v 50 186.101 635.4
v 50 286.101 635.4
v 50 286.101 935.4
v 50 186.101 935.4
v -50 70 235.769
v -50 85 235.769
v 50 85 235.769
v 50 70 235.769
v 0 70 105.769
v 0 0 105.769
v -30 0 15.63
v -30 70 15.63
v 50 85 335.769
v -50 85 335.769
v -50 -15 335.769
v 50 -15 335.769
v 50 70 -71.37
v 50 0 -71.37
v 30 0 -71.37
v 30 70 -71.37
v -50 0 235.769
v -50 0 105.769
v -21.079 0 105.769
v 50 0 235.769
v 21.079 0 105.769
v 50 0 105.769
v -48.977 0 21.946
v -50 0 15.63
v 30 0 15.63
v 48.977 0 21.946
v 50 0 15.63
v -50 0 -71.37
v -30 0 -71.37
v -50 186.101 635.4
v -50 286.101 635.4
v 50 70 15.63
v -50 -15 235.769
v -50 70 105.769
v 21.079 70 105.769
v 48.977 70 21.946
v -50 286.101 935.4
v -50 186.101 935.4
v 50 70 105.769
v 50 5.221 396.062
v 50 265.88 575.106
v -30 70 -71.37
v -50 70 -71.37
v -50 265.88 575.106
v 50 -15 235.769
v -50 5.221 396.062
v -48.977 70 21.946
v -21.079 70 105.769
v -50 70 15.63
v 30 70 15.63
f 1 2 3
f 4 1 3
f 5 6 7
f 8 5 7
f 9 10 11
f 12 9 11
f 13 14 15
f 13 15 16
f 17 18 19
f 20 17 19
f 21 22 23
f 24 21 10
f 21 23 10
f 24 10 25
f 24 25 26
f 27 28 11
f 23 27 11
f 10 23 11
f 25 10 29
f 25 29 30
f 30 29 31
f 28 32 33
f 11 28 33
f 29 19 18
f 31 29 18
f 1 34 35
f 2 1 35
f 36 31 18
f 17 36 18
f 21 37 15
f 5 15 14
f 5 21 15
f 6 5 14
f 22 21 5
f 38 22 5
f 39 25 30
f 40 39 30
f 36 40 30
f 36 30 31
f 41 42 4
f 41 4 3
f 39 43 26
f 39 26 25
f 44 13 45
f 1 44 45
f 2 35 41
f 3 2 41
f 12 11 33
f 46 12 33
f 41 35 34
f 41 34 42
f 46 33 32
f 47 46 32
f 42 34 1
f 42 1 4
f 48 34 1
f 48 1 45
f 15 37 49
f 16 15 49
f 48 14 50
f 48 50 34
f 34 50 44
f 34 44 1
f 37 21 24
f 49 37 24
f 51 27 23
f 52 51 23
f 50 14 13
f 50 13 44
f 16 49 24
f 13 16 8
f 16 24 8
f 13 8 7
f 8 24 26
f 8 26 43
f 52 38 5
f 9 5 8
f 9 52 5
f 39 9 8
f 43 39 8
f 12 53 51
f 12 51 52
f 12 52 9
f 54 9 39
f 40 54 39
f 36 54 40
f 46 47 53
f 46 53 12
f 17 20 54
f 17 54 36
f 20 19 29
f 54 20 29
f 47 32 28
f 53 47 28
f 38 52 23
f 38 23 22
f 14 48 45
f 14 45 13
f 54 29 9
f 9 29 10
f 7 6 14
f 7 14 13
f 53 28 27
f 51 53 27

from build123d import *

# Parameters (mm, degrees)
BOSS_EXTRUDE1_DEPTH = 70
SKETCH2_W           = 100
SKETCH2_H           = 100
BOSS_EXTRUDE2_DEPTH = 100
BOSS_EXTRUDE3_DEPTH = 100
SKETCH4_W           = 300
SKETCH4_H           = 100
BOSS_EXTRUDE4_DEPTH = 100


with BuildPart() as part:
    # Sketch1 → Boss-Extrude1 (new body)
    with BuildSketch(Plane(origin=(0, 0, 0), x_dir=(1, 0, 0), z_dir=(0, 1, 0))):
        Polygon((0, -105.768782521), (-30, -15.630000635), (-30, 71.369999365), (-50, 71.369999365), (-50, -15.630000635), (-48.97658566, -21.945790108), (-21.078607457, -105.768782521), (-50, -105.768782521), (-50, -235.768782521), (50, -235.768782521), (50, -105.768782521), (21.078607457, -105.768782521), (48.97658566, -21.945790108), (50, -15.630000635), (50, 71.369999365), (30, 71.369999365), (30, -15.630000635), align=None)
    extrude(amount=BOSS_EXTRUDE1_DEPTH)

    # Sketch2 → Boss-Extrude2 (add)
    with BuildSketch(Plane.XY.offset(235.768782521)):
        with Locations((0, 35)):
            Rectangle(SKETCH2_W, SKETCH2_H)
    extrude(amount=BOSS_EXTRUDE2_DEPTH)


with BuildPart() as body_2:
    # Sketch3 → Boss-Extrude3 (new body)
    with BuildSketch(Plane.ZY.offset(50)):
        Polygon((335.768782521, 85), (396.06206918, 5.220807325), (635.399647205, 186.100667301), (575.106360546, 265.879859976), align=None)
    extrude(amount=-BOSS_EXTRUDE3_DEPTH)


with BuildPart() as body_3:
    # Sketch4 → Boss-Extrude4 (new body)
    with BuildSketch(Plane.ZY.offset(50)):
        with Locations((785.399647205, 236.100667301)):
            Rectangle(SKETCH4_W, SKETCH4_H)
    extrude(amount=-BOSS_EXTRUDE4_DEPTH)


solid = Compound([part.part, body_2.part, body_3.part])
